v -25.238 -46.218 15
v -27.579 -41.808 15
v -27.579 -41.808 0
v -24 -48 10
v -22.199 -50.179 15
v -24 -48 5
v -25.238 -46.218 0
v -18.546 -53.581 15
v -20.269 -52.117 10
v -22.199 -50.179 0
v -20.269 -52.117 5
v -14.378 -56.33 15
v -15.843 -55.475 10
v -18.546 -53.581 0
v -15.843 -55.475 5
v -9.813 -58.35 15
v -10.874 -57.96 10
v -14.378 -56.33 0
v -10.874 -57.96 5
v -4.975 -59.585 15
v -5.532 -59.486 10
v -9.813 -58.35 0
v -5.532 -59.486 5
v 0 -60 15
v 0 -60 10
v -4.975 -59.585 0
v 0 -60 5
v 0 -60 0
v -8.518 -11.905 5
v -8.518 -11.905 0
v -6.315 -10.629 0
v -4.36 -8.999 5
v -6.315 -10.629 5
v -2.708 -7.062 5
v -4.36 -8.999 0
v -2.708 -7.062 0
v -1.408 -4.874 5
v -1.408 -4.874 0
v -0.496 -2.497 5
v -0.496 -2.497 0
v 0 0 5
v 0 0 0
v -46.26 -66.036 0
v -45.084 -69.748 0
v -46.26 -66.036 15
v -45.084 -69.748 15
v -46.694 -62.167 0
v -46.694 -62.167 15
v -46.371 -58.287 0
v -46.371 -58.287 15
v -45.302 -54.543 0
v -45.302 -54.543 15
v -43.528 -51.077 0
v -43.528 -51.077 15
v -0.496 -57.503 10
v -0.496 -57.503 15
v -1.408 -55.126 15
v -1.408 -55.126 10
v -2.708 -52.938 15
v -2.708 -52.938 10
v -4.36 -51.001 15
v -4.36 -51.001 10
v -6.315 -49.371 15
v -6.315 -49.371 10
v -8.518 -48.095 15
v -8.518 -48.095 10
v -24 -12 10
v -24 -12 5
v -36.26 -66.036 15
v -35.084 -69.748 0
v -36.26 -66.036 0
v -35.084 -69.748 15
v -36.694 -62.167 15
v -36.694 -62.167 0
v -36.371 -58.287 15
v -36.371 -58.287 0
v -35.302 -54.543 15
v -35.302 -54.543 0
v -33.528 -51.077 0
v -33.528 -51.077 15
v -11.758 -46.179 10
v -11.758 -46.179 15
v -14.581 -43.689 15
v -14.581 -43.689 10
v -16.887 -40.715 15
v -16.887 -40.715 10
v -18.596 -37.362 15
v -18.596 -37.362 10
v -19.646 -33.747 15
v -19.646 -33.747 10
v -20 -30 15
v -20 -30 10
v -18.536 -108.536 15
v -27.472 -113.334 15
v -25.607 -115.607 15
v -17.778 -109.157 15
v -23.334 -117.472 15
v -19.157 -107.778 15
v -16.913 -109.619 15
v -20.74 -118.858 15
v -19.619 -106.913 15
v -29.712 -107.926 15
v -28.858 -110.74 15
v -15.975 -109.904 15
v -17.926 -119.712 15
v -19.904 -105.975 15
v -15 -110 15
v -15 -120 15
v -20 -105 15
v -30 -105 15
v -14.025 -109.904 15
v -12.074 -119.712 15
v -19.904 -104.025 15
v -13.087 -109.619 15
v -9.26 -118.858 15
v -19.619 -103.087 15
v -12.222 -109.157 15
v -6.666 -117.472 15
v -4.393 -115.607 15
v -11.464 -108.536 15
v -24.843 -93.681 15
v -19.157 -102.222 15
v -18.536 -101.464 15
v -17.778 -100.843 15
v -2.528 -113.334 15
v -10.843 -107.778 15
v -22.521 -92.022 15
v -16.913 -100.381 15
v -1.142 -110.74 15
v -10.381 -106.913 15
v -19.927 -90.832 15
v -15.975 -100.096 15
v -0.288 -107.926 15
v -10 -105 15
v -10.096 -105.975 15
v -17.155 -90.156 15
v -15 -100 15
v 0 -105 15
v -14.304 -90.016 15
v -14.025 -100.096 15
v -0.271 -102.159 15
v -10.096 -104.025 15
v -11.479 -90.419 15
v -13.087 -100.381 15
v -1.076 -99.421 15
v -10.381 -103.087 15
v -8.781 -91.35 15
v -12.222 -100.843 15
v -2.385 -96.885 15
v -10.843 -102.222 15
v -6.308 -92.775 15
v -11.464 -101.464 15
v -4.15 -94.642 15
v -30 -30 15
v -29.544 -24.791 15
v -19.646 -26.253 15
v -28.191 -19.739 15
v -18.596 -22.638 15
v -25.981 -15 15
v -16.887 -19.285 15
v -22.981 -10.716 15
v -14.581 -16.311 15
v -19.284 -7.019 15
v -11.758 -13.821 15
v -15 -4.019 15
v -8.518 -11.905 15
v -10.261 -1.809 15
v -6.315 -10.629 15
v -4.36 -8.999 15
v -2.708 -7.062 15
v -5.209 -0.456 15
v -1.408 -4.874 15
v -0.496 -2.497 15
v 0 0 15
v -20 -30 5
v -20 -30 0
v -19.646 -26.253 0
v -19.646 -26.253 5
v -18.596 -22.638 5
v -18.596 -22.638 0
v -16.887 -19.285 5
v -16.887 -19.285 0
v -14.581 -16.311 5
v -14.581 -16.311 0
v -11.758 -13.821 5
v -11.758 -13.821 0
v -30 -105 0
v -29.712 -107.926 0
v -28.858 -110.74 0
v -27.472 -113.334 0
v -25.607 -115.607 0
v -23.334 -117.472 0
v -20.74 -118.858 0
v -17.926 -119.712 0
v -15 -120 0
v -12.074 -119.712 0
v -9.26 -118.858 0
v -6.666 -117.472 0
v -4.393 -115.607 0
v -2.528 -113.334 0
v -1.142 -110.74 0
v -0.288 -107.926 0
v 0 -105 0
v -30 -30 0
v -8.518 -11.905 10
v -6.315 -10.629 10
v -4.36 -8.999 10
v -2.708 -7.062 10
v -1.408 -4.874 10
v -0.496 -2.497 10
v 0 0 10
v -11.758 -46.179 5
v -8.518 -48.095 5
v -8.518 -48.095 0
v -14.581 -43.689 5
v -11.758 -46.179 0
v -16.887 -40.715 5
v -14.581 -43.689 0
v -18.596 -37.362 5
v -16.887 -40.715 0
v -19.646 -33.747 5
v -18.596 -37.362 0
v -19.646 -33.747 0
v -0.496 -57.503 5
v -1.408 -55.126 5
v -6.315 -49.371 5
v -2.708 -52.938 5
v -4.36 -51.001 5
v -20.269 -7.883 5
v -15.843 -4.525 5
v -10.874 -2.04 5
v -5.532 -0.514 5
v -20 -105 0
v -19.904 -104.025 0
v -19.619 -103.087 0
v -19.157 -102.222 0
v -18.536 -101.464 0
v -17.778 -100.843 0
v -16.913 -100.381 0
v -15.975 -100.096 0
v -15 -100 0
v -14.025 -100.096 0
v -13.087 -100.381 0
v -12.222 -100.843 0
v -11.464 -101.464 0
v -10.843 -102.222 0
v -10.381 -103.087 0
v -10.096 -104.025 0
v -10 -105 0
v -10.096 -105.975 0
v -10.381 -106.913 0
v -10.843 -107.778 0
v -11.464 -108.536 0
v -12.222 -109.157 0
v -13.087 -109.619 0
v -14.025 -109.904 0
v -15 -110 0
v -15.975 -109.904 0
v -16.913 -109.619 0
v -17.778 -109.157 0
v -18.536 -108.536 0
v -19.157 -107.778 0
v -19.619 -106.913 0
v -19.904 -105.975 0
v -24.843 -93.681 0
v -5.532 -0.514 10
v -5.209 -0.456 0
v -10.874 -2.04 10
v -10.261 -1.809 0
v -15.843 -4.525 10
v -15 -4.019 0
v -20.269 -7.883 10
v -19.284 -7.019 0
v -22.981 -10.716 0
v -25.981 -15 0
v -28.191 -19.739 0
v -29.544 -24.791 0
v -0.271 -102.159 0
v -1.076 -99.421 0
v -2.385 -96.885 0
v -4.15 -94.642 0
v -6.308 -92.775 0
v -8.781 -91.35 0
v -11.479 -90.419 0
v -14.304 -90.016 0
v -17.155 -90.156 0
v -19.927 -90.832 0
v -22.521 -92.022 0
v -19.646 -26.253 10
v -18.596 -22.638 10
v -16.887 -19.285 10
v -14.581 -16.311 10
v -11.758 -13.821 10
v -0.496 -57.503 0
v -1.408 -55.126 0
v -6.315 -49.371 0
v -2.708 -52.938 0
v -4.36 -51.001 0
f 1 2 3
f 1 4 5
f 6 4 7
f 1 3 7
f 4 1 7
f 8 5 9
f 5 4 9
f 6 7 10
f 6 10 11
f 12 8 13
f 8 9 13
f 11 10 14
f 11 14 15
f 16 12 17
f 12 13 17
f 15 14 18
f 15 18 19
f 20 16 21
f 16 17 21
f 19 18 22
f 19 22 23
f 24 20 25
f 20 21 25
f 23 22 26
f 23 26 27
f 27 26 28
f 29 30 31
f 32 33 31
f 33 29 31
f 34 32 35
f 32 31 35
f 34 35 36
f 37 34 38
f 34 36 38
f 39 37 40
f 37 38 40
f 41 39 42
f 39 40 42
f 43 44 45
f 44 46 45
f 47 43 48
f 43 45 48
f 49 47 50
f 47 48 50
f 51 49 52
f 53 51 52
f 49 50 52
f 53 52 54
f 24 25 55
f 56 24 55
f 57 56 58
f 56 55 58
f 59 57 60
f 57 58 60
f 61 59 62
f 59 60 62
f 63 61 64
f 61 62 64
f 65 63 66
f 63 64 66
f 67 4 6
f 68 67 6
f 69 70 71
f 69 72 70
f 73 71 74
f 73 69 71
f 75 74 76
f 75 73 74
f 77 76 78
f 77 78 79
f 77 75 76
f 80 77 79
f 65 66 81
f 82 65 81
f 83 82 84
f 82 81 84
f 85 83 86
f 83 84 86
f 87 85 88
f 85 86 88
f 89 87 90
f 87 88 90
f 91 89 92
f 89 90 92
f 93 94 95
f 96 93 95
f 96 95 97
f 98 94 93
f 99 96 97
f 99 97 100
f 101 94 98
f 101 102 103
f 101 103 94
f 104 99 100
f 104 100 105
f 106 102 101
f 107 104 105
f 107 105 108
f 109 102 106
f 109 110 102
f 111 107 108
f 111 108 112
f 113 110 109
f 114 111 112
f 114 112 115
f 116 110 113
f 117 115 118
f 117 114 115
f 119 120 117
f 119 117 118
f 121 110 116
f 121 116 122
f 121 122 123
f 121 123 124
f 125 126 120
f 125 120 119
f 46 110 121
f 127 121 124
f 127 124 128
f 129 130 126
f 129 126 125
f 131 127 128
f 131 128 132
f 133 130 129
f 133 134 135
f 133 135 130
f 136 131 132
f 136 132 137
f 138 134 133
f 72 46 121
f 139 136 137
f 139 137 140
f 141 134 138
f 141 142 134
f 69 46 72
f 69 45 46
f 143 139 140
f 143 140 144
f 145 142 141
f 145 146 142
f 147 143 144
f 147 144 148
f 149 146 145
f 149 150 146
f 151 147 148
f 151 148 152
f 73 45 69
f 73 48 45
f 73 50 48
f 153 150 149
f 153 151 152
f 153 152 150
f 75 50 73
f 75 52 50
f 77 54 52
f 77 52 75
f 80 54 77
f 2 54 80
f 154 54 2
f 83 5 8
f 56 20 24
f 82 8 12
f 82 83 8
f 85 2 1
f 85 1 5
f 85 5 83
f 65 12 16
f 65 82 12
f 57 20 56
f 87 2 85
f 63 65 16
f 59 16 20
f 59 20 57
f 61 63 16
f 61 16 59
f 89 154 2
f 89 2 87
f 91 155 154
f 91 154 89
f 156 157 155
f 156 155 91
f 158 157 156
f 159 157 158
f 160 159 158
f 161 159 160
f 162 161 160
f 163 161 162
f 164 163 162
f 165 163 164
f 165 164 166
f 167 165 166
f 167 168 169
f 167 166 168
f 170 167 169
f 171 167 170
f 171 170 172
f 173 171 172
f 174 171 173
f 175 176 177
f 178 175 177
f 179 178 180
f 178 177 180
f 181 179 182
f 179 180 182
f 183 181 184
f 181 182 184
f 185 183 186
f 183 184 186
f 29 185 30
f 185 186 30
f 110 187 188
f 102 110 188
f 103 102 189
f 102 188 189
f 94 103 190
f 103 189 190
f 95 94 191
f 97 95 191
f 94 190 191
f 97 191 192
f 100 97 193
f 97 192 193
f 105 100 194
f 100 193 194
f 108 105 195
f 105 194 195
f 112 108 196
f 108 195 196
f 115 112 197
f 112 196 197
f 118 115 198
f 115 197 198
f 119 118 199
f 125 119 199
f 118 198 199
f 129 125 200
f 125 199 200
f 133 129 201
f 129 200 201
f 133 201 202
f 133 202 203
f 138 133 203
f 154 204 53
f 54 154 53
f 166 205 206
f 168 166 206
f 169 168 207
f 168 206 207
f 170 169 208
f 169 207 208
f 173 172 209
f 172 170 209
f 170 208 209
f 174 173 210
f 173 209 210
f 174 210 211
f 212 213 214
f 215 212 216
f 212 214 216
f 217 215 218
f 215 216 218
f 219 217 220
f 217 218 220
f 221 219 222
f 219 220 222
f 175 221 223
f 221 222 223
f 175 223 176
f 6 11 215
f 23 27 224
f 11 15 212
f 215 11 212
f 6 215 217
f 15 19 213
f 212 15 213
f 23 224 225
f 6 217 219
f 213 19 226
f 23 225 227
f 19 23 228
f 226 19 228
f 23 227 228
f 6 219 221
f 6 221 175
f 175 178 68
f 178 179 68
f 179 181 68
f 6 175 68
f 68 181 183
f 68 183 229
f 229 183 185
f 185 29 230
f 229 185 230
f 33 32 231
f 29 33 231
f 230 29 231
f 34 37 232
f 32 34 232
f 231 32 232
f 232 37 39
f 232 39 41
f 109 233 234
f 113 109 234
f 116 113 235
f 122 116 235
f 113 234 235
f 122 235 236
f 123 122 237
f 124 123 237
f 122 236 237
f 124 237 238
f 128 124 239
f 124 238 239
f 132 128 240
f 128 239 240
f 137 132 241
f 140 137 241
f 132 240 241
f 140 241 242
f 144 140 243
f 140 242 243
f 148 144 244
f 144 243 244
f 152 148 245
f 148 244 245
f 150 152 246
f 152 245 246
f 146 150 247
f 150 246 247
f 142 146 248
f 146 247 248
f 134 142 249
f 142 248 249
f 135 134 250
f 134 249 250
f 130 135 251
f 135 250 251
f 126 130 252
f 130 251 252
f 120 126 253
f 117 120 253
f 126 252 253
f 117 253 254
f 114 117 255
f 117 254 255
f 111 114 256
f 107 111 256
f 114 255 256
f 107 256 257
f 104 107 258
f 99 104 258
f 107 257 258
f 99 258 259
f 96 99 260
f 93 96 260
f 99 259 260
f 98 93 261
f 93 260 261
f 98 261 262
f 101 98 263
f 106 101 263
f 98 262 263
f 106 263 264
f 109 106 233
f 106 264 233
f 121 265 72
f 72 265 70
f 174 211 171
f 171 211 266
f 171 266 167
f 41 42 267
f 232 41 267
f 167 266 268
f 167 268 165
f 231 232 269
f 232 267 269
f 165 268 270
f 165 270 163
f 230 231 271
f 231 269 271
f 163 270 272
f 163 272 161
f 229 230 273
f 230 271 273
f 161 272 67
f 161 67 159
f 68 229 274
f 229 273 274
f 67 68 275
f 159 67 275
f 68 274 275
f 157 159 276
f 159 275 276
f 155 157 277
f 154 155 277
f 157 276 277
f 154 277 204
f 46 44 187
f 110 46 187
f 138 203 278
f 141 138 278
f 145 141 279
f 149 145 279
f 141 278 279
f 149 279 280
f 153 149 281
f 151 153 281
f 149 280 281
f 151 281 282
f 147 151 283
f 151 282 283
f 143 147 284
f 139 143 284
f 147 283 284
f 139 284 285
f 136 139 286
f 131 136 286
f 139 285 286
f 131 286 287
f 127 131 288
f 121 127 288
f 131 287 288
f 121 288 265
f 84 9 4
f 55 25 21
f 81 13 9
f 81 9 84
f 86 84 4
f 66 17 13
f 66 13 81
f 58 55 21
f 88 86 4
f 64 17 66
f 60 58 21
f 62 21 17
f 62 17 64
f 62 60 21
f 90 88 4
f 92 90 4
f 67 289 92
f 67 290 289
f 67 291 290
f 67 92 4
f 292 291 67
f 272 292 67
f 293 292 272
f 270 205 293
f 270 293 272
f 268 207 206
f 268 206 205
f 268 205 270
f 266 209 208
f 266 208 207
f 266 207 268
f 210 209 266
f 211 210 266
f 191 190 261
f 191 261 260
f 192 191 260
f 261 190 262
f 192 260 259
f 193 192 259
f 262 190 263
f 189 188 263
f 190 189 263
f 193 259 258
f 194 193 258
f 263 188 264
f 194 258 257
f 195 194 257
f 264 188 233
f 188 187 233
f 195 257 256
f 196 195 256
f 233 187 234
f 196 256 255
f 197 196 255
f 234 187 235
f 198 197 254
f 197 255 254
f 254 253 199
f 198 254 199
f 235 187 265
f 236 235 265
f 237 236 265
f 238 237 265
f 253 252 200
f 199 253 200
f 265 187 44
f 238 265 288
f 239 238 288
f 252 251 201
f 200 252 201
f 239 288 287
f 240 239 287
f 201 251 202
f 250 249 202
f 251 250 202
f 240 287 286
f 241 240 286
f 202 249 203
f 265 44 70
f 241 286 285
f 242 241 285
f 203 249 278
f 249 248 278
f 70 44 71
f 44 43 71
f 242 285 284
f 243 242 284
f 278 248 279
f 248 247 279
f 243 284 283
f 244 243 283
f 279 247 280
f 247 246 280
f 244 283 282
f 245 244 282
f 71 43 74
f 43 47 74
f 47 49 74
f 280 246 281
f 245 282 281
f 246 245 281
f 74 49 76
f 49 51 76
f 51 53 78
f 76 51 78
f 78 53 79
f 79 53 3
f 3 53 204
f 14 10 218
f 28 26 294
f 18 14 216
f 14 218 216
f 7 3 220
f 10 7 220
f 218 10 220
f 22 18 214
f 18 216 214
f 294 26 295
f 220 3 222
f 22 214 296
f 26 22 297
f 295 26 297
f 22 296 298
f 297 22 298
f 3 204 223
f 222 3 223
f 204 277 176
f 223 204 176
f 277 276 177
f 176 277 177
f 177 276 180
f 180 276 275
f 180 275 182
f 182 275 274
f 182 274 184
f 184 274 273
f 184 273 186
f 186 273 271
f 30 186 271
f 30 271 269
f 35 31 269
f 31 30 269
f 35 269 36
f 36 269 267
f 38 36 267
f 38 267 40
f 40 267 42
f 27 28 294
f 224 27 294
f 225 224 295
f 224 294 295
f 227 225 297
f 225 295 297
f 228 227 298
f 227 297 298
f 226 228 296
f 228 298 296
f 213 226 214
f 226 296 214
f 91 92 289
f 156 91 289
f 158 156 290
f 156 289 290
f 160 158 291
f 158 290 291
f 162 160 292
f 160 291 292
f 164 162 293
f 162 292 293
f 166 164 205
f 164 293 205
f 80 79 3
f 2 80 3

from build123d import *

# Parameters (mm, degrees)
BOSS_EXTRUDE1_DEPTH = 15
FILLET1_R           = 20
FILLET2_R           = 15
SKETCH2_W           = 5
SKETCH2_H           = 60
CUT_EXTRUDE1_DEPTH  = 24


with BuildPart() as part:
    # Sketch1 → Boss-Extrude1 (new body)
    # profile 1 of 6: a face of its own
    with BuildSketch(Plane.XY):
        with BuildLine():
            Line((-20, -30), (-30, -30))
            ThreePointArc((-30, -30), (-29.388396861, -36.026784376), (-27.578524672, -41.807835403))
            Line((-27.578524672, -41.807835403), (-20, -30))
        make_face()
    # profile 2 of 6: a face of its own
    with BuildSketch(Plane.XY):
        with BuildLine():
            Line((0, -10), (0, 0))
            ThreePointArc((0, 0), (-21.213203436, -8.786796564), (-30, -30))
            Line((-30, -30), (-20, -30))
            ThreePointArc((-20, -30), (-14.142135624, -15.857864376), (0, -10))
        make_face()
    # profile 3 of 6: a face of its own
    with BuildSketch(Plane.XY):
        with BuildLine():
            ThreePointArc((0, -50), (-14.142135624, -44.142135624), (-20, -30))
            Line((-20, -30), (-27.578524672, -41.807835403))
            ThreePointArc((-27.578524672, -41.807835403), (-16.519154608, -55.04231481), (0, -60))
            Line((0, -60), (0, -50))
        make_face()
    # profile 4 of 6: a face of its own
    with BuildSketch(Plane.XY):
        with BuildLine():
            ThreePointArc((-27.578524672, -41.807835403), (-29.388396861, -36.026784376), (-30, -30))
            Line((-30, -30), (-49.254650189, -60))
            Line((-49.254650189, -60), (-30, -105))
            ThreePointArc((-30, -105), (-28.650020621, -98.780921528), (-24.84307506, -93.681260081))
            Line((-24.84307506, -93.681260081), (-39.254650189, -60))
            Line((-39.254650189, -60), (-27.578524672, -41.807835403))
        make_face()
    # profile 5 of 6: a face of its own
    with BuildSketch(Plane.XY):
        with BuildLine():
            ThreePointArc((-24.84307506, -93.681260081), (-28.650020621, -98.780921528), (-30, -105))
            Line((-30, -105), (-20, -105))
            Line((-20, -105), (-24.84307506, -93.681260081))
        make_face()
    # profile 6 of 6: a face of its own
    with BuildSketch(Plane.XY):
        with BuildLine():
            Line((-20, -105), (-30, -105))
            ThreePointArc((-30, -105), (-15, -120), (0, -105))
            ThreePointArc((0, -105), (-8.780921528, -91.349979379), (-24.84307506, -93.681260081))
            Line((-24.84307506, -93.681260081), (-20, -105))
        make_face()
        with BuildLine():
            ThreePointArc((-10, -105), (-15, -110), (-20, -105))
            ThreePointArc((-20, -105), (-15, -100), (-10, -105))
        make_face(mode=Mode.SUBTRACT)
    extrude(amount=BOSS_EXTRUDE1_DEPTH)

    # Fillet1
    fillet1_edges = [part.edges().sort_by_distance(p)[0] for p in [
        (-39.254650189, -60, 7.5),
        (-49.254650189, -60, 7.5),
    ]]
    fillet(fillet1_edges, radius=FILLET1_R)

    # Fillet2
    # the kernel refuses this fillet: 15 mm, written as the material it takes off along each edge
    with BuildSketch(Plane(origin=(0, -50, -25), x_dir=(-0.9759000729485309, 0.21821789023600283, 0), z_dir=(0, 0, 1))) as fillet2_piece_1:
        with BuildLine():
            CenterArc((12.001983963, 14.638501094), FILLET2_R, 198.983752857, 58.411864495)
            Line((-2.182178902, 9.759000729), (-2.46586216, 9.661410722))
            ThreePointArc((-2.46586216, 9.661410722), (-1.383859473, 4.814034998), (-0.292770022, -0.065465367))
            Line((-0.292770022, -0.065465367), (0.065465367, -0.292770022))
            ThreePointArc((0.065465367, -0.292770022), (4.364357805, 0.181998541), (8.663250242, -0.292770022))
            Line((8.663250242, -0.292770022), (8.728715609, 0))
        make_face()
    extrude(amount=65, mode=Mode.SUBTRACT)
    with BuildSketch(Plane(origin=(0, -10, -25), x_dir=(0, 1, 0), z_dir=(0, 0, 1))) as fillet2_piece_2:
        with BuildLine():
            CenterArc((11.666666667, 14.90711985), FILLET2_R, 205.208765297, 58.411864495)
            Line((-1.904761905, 8.5183542), (-2.176190476, 8.390578887))
            ThreePointArc((-2.176190476, 8.390578887), (-0.774768563, 4.298892438), (-0.3, 0))
            Line((-0.3, 0), (0, -0.3))
            ThreePointArc((0, -0.3), (5, -0.3), (9.966666667, -0.298142397))
            Line((9.966666667, -0.298142397), (10, 0))
        make_face()
    extrude(amount=65, mode=Mode.SUBTRACT)

    # Sketch2 → Cut-Extrude1 (cut)
    with BuildSketch(Plane(origin=(0, 0, 0), x_dir=(0, 0, -1), z_dir=(1, 0, 0))):
        with Locations((-7.5, -30)):
            Rectangle(SKETCH2_W, SKETCH2_H)
    extrude(amount=-CUT_EXTRUDE1_DEPTH, mode=Mode.SUBTRACT)


solid = part.part
